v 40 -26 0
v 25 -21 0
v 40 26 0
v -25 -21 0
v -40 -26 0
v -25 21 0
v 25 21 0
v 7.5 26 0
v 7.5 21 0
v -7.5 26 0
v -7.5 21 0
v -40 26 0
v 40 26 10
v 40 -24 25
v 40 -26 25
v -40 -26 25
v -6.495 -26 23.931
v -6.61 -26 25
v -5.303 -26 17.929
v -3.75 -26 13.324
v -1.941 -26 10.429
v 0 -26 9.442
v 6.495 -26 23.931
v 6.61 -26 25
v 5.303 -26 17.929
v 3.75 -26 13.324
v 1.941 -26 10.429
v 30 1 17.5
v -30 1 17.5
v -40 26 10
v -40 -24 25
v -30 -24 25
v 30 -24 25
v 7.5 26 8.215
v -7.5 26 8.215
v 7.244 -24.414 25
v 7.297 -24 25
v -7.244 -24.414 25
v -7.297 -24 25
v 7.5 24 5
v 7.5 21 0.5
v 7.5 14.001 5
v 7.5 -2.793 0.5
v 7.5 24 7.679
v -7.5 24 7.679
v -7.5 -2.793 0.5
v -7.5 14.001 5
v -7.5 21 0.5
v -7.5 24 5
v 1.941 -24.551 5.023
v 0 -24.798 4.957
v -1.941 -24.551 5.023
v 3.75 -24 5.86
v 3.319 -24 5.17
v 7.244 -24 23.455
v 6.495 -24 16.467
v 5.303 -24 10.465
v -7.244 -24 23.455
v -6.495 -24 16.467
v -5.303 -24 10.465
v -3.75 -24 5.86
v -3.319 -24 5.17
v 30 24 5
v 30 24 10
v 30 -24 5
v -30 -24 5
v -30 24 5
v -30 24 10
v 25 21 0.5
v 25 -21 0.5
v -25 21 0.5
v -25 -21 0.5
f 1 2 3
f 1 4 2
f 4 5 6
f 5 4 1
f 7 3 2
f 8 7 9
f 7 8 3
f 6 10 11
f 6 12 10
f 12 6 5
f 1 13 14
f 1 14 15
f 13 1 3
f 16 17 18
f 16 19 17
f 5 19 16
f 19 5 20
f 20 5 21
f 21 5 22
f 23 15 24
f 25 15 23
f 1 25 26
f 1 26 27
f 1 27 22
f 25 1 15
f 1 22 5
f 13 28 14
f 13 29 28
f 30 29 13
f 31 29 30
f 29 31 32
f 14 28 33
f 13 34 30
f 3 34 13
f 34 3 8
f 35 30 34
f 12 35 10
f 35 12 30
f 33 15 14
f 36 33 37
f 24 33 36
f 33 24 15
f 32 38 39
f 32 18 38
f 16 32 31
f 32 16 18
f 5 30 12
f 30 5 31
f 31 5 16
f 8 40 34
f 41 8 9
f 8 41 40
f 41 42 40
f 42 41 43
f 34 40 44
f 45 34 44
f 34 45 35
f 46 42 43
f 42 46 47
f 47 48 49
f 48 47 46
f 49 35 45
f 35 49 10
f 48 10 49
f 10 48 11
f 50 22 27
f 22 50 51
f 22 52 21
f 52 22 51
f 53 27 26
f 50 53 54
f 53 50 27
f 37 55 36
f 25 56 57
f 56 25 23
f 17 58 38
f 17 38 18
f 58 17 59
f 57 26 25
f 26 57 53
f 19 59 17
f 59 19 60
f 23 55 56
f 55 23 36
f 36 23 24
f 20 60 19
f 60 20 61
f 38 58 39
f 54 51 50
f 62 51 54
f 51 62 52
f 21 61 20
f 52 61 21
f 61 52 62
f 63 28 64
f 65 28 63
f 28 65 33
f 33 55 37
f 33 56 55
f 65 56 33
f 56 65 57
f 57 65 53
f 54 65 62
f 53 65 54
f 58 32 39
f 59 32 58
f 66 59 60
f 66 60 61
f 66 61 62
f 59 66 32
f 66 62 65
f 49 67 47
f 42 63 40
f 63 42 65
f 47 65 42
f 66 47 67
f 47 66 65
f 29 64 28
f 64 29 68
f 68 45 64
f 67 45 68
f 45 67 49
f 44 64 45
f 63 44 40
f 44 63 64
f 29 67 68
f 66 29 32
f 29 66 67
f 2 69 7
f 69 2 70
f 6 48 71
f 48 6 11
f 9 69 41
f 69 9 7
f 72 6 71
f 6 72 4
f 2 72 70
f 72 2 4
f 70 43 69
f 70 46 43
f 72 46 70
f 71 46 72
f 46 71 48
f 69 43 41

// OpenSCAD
// ==========================================
// Xentient Framework - Anchor: Desk Pedestal Adapter
// Weighted wedge stand, 15° upward tilt, cable routing
// Per Framework §5
// ==========================================
// Component: Male cylinder (40mm dia) with cross-keys
//            Wedge-shaped base, 15° upward angle
//            Hollow routing channel for USB-C cable
// Material: PETG (structural) + weighted fill (sand/metal in base)
// Units: mm

$fn = 64;

// ==========================================
// ANCHOR DIMENSIONS (matching hub rear)
// ==========================================

Anchor_Dia   = 40.0;    // Male cylinder diameter
Anchor_Depth = 6.0;     // Insertion depth
Anchor_Key_W = 10.0;    // Anti-rotation key width

// Desk pedestal dimensions
Tilt_Angle   = 15;      // 15° upward angle for optimal viewing
Base_W       = 80.0;    // Base width (stable footprint)
Base_D       = 70.0;    // Base depth (front to back)
Base_H       = 25.0;    // Base height at rear (highest point)
Base_Min_H   = 10.0;    // Base height at front (lowest point)
Wall_T       = 2.5;     // Wall thickness

// Cable routing
Cable_D      = 13.0;    // Channel diameter (matches hub rear 15mm wire hole: 13+2=15)

// Weight fill pocket (for sand/metal insert)
Weight_W     = 60.0;
Weight_D     = 50.0;
Weight_H     = 10.0;

// ==========================================
// MODULE: anchor_desk_pedestal()
// ==========================================

module anchor_desk_pedestal() {
    difference() {
        union() {
            // Male cylinder (plugs into hub rear)
            cylinder(h=Anchor_Depth, d=Anchor_Dia, $fn=64);

            // Anti-rotation cross-keys
            for (a = [0, 90]) {
                rotate([0, 0, a])
                    translate([0, -Anchor_Key_W/2, 0])
                        cube([Anchor_Dia/2 + 2, Anchor_Key_W, Anchor_Depth]);
            }

            // Wedge base (15° tilt)
            // Front is low, rear is high for upward viewing angle
            hull() {
                // Front face (low)
                translate([0, Base_D/2 - 10, Base_Min_H/2])
                    cube([Base_W, 2, Base_Min_H], center=true);
                // Rear face (high)
                translate([0, -Base_D/2 + 10, Base_H/2])
                    cube([Base_W, 2, Base_H], center=true);
            }

            // Draft taper removed — hub pocket is straight 40mm, taper
            // would prevent insertion. Cross-key clearance provides fit tolerance.
        }

        // Hollow interior for weight fill
        translate([0, 0, Wall_T])
            hull() {
                translate([0, Base_D/2 - 12, Base_Min_H/2])
                    cube([Weight_W, 2, Base_Min_H - 2*Wall_T], center=true);
                translate([0, -Base_D/2 + 12, Base_H/2])
                    cube([Weight_W, 2, Base_H - 2*Wall_T], center=true);
            }

        // Weight fill access (bottom opening)
        translate([0, 0, -1])
            hull() {
                translate([0, Base_D/2 - 15, 0])
                    cube([Weight_W - 10, 2, 3], center=true);
                translate([0, -Base_D/2 + 15, 0])
                    cube([Weight_W - 10, 2, 3], center=true);
            }

        // Cable routing channel (from rear, through base, to anchor cylinder)
        // Channel follows the 15° tilt
        translate([0, 5, 0])
            rotate([Tilt_Angle, 0, 0]) {
                // Horizontal section under base
                translate([0, 0, -Base_Min_H/2])
                    cube([Cable_D + 2, Base_D + 10, Cable_D + 2], center=true);
                // Vertical section up to anchor
                translate([0, -Base_D/2 + 15, Base_H/2])
                    cylinder(h=Anchor_Depth + Base_H, d=Cable_D + 2, $fn=24);
            }

        // Anti-rotation keyway cutouts (matching hub grooves)
    }
}

// ==========================================
// RENDER
// ==========================================

anchor_desk_pedestal();
